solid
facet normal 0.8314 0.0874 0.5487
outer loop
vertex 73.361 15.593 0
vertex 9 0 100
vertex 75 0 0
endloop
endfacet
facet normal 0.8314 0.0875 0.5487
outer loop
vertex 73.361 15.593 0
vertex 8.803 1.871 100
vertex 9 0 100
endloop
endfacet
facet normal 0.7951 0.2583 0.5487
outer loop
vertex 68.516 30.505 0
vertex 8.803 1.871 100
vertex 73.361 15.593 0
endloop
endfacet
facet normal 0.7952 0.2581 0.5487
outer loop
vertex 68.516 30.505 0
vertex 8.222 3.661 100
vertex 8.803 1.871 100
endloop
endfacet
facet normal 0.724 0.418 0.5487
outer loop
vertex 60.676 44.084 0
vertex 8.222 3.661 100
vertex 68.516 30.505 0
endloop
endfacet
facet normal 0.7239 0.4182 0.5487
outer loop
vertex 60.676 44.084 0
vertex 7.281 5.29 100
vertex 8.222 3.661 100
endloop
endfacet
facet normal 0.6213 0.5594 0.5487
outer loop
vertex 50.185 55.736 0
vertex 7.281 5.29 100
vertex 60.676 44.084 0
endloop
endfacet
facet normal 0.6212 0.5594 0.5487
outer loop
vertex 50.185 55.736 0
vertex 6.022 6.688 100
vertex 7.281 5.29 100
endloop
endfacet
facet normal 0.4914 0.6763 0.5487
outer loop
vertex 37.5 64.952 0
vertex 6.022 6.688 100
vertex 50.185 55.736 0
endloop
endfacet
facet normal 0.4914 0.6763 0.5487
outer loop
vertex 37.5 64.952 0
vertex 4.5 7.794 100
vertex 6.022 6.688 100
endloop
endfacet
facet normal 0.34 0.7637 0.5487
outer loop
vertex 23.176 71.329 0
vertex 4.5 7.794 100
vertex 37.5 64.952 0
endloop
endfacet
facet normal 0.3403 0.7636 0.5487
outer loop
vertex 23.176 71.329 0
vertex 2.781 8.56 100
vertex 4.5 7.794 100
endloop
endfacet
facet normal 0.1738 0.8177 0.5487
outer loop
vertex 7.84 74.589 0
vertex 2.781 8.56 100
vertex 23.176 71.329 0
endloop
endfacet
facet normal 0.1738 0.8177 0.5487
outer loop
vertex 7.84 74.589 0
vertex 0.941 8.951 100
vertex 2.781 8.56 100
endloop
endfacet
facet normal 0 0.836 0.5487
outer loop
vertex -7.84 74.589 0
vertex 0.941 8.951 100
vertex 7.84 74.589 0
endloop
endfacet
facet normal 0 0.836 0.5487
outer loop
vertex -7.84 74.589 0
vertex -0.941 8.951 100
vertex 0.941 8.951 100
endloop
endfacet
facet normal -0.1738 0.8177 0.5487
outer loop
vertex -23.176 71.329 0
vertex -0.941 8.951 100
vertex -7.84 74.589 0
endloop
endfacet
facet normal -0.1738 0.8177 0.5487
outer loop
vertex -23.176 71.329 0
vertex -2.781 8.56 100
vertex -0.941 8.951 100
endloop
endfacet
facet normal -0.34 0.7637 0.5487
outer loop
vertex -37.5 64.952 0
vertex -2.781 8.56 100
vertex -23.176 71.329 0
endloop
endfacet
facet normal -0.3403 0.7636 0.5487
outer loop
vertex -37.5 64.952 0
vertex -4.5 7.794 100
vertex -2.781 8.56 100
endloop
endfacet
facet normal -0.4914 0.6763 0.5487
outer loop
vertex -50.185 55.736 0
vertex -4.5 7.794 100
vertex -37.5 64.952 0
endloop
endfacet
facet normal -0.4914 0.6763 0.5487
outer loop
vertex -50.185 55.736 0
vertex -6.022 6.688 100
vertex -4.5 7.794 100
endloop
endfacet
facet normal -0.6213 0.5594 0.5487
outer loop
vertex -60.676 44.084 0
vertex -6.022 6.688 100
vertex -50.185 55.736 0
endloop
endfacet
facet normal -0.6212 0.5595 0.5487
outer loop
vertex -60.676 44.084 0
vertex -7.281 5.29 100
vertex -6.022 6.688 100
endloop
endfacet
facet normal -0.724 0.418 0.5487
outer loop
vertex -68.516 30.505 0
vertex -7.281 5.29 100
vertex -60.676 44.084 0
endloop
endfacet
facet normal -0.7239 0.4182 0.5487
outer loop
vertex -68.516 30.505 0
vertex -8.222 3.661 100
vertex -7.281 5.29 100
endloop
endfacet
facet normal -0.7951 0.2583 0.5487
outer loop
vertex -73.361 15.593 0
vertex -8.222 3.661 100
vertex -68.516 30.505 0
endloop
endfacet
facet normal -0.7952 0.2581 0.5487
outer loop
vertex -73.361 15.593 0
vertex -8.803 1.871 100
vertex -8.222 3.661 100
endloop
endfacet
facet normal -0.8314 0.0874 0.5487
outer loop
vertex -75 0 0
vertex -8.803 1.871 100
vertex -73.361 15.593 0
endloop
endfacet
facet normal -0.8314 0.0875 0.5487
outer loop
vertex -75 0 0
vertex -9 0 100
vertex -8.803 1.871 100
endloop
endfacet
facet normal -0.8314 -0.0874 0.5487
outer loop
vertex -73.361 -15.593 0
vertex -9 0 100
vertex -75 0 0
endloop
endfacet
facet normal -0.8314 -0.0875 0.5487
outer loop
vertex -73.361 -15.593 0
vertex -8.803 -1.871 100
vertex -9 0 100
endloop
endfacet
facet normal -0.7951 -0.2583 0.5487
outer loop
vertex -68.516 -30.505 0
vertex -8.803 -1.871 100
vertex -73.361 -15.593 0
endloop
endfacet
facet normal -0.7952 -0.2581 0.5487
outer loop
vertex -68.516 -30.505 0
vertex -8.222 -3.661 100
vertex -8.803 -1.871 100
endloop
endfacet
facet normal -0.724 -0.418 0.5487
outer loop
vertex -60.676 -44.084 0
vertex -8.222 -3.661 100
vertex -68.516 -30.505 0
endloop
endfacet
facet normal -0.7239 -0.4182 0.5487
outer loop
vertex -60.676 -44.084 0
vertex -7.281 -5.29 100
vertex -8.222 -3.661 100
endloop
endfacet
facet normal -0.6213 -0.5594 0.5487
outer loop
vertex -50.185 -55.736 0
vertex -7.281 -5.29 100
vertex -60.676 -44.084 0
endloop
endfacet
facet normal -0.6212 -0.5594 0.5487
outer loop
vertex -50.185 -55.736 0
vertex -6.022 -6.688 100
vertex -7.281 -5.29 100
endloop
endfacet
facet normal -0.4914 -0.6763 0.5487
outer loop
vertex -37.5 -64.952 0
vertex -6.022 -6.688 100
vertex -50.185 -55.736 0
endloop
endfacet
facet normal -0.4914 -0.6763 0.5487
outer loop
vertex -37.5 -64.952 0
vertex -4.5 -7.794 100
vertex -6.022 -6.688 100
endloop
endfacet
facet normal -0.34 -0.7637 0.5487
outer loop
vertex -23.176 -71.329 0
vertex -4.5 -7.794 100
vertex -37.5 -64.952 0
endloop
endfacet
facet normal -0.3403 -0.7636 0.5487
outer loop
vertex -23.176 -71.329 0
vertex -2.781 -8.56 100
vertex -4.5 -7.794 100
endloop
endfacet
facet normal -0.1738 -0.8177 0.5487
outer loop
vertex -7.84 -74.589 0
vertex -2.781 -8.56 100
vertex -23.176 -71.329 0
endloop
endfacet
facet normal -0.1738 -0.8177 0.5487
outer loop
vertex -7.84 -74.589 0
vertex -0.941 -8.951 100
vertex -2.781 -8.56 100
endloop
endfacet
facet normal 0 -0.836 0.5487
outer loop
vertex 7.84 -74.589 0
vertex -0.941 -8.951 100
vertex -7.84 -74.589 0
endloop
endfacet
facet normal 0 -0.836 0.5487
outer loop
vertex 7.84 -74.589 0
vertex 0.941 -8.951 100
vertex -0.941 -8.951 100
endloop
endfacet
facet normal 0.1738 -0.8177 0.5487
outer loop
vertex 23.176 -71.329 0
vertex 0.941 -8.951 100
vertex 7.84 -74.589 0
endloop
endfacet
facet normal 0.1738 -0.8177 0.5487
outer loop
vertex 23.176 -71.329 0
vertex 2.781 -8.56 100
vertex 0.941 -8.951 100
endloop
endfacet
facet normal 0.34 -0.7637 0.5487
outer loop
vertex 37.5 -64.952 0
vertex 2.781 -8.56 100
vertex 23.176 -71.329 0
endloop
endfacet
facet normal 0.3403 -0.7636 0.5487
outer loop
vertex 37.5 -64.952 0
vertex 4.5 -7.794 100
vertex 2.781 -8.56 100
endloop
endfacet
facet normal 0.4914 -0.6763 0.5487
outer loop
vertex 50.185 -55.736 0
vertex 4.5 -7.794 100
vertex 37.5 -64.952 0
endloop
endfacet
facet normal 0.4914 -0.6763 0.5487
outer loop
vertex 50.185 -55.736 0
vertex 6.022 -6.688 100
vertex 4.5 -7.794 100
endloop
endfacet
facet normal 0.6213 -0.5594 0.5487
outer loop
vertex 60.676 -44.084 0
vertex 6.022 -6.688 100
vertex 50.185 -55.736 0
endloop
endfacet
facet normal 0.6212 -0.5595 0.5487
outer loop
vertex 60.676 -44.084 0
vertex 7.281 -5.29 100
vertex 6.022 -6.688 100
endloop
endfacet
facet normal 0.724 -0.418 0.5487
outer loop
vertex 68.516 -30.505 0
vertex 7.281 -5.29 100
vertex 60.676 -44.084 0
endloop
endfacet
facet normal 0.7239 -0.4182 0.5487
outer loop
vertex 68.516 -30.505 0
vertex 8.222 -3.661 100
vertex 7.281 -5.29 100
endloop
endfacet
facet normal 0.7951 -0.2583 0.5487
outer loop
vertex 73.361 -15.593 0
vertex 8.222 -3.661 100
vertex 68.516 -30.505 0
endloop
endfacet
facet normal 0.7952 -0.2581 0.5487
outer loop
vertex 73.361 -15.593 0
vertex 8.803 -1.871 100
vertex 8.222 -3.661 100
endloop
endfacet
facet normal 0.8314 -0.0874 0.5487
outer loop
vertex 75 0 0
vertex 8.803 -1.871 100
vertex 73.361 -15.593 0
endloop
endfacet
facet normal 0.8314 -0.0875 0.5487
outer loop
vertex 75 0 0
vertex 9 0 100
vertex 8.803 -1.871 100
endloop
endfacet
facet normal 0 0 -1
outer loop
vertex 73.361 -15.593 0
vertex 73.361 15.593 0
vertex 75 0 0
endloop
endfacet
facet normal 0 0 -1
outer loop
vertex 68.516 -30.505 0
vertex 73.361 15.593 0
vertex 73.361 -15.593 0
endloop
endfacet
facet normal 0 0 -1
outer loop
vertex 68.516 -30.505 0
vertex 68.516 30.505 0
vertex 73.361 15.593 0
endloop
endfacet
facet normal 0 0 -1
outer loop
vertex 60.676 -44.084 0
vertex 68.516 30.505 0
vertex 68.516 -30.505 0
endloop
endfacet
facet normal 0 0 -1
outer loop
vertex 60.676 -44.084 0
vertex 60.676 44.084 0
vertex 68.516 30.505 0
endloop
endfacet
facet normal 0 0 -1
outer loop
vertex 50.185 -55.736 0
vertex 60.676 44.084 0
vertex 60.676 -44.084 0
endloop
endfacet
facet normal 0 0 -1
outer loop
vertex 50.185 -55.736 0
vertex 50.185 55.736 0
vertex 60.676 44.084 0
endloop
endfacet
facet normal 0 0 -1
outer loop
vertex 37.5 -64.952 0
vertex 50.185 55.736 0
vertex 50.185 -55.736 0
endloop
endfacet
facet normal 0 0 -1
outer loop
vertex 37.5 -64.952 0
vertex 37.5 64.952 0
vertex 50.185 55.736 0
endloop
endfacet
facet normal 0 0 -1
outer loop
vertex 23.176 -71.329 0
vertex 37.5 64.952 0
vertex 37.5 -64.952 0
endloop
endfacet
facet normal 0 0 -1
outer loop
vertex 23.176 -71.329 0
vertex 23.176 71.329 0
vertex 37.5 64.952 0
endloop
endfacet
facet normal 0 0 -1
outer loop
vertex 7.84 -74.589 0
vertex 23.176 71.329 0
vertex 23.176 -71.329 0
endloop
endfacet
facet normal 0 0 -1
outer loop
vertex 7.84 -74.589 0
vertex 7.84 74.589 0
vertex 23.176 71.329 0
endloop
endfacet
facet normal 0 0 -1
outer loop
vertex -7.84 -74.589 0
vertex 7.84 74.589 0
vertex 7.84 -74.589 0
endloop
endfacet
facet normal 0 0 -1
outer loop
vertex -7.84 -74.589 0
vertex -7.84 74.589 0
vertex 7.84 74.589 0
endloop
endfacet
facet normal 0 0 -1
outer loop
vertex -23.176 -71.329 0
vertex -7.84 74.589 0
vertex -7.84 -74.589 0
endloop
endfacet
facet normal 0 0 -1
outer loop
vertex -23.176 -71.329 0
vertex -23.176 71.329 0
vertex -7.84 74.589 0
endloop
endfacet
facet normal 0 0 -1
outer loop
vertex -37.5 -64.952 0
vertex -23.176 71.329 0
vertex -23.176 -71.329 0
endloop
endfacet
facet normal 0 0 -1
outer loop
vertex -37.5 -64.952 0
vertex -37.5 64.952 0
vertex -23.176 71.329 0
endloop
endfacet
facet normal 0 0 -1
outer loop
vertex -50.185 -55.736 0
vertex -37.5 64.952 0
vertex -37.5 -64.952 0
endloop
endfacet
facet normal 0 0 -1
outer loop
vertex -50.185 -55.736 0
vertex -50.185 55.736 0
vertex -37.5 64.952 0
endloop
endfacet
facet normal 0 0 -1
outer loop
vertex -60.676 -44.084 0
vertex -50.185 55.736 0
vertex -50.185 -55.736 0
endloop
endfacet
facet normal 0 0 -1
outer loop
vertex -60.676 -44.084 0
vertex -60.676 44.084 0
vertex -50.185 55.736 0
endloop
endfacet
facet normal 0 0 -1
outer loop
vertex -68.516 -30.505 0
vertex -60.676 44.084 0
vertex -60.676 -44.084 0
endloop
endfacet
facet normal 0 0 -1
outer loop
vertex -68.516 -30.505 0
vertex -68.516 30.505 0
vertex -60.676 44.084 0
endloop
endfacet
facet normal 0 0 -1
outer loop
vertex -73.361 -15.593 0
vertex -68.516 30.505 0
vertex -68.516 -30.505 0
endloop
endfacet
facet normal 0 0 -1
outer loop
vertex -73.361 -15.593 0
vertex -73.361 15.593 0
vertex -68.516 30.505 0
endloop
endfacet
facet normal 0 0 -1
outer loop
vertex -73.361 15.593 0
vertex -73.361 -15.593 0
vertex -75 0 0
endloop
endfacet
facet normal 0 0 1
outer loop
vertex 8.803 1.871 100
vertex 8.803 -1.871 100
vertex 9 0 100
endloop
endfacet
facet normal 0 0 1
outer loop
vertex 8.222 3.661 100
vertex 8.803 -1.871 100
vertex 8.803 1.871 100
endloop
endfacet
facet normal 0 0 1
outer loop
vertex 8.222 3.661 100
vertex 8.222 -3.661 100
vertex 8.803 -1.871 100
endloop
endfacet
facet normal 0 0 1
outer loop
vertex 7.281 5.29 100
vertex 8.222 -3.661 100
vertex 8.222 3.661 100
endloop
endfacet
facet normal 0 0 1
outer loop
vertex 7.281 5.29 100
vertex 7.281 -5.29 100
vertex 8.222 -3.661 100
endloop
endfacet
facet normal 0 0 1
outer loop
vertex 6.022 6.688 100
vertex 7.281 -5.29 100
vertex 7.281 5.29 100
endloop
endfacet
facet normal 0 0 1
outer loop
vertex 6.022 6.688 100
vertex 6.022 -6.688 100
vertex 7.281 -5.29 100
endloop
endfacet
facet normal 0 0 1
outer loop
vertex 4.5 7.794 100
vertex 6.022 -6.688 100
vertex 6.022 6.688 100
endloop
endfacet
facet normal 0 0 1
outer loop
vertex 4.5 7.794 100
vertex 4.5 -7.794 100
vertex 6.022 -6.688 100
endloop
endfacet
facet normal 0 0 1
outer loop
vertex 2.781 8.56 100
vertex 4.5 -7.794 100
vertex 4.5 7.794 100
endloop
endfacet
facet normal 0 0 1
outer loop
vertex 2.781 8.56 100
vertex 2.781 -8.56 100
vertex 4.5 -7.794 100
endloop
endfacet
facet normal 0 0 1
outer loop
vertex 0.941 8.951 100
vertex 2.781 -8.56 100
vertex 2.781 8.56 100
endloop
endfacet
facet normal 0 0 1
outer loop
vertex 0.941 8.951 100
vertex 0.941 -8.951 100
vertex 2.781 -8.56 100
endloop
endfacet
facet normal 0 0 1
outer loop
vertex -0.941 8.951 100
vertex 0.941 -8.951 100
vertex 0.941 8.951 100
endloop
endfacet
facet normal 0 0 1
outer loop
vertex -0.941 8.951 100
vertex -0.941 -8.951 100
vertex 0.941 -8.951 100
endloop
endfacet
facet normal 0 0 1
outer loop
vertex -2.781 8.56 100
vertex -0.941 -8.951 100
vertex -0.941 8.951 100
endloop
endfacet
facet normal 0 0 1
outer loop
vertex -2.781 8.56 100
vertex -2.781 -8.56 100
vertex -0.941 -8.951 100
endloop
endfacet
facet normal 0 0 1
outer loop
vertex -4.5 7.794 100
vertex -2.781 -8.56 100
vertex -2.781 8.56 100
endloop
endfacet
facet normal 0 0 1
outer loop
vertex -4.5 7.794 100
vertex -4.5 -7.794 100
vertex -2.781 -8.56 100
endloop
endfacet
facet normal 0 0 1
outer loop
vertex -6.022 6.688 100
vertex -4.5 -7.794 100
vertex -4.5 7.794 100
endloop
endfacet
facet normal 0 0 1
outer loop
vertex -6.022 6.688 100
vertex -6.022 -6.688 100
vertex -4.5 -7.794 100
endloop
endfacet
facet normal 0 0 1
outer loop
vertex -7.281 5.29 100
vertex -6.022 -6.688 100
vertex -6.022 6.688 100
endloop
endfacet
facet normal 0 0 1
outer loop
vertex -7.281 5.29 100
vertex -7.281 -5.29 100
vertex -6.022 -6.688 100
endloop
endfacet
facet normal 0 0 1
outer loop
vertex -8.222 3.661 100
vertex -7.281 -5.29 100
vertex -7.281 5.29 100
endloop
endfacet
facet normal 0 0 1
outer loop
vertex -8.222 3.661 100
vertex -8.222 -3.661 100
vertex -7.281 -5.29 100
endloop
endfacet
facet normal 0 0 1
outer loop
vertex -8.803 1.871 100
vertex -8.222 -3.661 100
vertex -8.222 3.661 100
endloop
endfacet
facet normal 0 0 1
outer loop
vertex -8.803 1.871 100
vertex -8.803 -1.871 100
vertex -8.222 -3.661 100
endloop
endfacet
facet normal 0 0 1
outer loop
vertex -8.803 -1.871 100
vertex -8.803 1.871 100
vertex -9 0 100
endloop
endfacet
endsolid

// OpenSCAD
module fanDuctToPnumatics(){
	
	cylinder(100,75,9,false);
}

fanDuctToPnumatics();
